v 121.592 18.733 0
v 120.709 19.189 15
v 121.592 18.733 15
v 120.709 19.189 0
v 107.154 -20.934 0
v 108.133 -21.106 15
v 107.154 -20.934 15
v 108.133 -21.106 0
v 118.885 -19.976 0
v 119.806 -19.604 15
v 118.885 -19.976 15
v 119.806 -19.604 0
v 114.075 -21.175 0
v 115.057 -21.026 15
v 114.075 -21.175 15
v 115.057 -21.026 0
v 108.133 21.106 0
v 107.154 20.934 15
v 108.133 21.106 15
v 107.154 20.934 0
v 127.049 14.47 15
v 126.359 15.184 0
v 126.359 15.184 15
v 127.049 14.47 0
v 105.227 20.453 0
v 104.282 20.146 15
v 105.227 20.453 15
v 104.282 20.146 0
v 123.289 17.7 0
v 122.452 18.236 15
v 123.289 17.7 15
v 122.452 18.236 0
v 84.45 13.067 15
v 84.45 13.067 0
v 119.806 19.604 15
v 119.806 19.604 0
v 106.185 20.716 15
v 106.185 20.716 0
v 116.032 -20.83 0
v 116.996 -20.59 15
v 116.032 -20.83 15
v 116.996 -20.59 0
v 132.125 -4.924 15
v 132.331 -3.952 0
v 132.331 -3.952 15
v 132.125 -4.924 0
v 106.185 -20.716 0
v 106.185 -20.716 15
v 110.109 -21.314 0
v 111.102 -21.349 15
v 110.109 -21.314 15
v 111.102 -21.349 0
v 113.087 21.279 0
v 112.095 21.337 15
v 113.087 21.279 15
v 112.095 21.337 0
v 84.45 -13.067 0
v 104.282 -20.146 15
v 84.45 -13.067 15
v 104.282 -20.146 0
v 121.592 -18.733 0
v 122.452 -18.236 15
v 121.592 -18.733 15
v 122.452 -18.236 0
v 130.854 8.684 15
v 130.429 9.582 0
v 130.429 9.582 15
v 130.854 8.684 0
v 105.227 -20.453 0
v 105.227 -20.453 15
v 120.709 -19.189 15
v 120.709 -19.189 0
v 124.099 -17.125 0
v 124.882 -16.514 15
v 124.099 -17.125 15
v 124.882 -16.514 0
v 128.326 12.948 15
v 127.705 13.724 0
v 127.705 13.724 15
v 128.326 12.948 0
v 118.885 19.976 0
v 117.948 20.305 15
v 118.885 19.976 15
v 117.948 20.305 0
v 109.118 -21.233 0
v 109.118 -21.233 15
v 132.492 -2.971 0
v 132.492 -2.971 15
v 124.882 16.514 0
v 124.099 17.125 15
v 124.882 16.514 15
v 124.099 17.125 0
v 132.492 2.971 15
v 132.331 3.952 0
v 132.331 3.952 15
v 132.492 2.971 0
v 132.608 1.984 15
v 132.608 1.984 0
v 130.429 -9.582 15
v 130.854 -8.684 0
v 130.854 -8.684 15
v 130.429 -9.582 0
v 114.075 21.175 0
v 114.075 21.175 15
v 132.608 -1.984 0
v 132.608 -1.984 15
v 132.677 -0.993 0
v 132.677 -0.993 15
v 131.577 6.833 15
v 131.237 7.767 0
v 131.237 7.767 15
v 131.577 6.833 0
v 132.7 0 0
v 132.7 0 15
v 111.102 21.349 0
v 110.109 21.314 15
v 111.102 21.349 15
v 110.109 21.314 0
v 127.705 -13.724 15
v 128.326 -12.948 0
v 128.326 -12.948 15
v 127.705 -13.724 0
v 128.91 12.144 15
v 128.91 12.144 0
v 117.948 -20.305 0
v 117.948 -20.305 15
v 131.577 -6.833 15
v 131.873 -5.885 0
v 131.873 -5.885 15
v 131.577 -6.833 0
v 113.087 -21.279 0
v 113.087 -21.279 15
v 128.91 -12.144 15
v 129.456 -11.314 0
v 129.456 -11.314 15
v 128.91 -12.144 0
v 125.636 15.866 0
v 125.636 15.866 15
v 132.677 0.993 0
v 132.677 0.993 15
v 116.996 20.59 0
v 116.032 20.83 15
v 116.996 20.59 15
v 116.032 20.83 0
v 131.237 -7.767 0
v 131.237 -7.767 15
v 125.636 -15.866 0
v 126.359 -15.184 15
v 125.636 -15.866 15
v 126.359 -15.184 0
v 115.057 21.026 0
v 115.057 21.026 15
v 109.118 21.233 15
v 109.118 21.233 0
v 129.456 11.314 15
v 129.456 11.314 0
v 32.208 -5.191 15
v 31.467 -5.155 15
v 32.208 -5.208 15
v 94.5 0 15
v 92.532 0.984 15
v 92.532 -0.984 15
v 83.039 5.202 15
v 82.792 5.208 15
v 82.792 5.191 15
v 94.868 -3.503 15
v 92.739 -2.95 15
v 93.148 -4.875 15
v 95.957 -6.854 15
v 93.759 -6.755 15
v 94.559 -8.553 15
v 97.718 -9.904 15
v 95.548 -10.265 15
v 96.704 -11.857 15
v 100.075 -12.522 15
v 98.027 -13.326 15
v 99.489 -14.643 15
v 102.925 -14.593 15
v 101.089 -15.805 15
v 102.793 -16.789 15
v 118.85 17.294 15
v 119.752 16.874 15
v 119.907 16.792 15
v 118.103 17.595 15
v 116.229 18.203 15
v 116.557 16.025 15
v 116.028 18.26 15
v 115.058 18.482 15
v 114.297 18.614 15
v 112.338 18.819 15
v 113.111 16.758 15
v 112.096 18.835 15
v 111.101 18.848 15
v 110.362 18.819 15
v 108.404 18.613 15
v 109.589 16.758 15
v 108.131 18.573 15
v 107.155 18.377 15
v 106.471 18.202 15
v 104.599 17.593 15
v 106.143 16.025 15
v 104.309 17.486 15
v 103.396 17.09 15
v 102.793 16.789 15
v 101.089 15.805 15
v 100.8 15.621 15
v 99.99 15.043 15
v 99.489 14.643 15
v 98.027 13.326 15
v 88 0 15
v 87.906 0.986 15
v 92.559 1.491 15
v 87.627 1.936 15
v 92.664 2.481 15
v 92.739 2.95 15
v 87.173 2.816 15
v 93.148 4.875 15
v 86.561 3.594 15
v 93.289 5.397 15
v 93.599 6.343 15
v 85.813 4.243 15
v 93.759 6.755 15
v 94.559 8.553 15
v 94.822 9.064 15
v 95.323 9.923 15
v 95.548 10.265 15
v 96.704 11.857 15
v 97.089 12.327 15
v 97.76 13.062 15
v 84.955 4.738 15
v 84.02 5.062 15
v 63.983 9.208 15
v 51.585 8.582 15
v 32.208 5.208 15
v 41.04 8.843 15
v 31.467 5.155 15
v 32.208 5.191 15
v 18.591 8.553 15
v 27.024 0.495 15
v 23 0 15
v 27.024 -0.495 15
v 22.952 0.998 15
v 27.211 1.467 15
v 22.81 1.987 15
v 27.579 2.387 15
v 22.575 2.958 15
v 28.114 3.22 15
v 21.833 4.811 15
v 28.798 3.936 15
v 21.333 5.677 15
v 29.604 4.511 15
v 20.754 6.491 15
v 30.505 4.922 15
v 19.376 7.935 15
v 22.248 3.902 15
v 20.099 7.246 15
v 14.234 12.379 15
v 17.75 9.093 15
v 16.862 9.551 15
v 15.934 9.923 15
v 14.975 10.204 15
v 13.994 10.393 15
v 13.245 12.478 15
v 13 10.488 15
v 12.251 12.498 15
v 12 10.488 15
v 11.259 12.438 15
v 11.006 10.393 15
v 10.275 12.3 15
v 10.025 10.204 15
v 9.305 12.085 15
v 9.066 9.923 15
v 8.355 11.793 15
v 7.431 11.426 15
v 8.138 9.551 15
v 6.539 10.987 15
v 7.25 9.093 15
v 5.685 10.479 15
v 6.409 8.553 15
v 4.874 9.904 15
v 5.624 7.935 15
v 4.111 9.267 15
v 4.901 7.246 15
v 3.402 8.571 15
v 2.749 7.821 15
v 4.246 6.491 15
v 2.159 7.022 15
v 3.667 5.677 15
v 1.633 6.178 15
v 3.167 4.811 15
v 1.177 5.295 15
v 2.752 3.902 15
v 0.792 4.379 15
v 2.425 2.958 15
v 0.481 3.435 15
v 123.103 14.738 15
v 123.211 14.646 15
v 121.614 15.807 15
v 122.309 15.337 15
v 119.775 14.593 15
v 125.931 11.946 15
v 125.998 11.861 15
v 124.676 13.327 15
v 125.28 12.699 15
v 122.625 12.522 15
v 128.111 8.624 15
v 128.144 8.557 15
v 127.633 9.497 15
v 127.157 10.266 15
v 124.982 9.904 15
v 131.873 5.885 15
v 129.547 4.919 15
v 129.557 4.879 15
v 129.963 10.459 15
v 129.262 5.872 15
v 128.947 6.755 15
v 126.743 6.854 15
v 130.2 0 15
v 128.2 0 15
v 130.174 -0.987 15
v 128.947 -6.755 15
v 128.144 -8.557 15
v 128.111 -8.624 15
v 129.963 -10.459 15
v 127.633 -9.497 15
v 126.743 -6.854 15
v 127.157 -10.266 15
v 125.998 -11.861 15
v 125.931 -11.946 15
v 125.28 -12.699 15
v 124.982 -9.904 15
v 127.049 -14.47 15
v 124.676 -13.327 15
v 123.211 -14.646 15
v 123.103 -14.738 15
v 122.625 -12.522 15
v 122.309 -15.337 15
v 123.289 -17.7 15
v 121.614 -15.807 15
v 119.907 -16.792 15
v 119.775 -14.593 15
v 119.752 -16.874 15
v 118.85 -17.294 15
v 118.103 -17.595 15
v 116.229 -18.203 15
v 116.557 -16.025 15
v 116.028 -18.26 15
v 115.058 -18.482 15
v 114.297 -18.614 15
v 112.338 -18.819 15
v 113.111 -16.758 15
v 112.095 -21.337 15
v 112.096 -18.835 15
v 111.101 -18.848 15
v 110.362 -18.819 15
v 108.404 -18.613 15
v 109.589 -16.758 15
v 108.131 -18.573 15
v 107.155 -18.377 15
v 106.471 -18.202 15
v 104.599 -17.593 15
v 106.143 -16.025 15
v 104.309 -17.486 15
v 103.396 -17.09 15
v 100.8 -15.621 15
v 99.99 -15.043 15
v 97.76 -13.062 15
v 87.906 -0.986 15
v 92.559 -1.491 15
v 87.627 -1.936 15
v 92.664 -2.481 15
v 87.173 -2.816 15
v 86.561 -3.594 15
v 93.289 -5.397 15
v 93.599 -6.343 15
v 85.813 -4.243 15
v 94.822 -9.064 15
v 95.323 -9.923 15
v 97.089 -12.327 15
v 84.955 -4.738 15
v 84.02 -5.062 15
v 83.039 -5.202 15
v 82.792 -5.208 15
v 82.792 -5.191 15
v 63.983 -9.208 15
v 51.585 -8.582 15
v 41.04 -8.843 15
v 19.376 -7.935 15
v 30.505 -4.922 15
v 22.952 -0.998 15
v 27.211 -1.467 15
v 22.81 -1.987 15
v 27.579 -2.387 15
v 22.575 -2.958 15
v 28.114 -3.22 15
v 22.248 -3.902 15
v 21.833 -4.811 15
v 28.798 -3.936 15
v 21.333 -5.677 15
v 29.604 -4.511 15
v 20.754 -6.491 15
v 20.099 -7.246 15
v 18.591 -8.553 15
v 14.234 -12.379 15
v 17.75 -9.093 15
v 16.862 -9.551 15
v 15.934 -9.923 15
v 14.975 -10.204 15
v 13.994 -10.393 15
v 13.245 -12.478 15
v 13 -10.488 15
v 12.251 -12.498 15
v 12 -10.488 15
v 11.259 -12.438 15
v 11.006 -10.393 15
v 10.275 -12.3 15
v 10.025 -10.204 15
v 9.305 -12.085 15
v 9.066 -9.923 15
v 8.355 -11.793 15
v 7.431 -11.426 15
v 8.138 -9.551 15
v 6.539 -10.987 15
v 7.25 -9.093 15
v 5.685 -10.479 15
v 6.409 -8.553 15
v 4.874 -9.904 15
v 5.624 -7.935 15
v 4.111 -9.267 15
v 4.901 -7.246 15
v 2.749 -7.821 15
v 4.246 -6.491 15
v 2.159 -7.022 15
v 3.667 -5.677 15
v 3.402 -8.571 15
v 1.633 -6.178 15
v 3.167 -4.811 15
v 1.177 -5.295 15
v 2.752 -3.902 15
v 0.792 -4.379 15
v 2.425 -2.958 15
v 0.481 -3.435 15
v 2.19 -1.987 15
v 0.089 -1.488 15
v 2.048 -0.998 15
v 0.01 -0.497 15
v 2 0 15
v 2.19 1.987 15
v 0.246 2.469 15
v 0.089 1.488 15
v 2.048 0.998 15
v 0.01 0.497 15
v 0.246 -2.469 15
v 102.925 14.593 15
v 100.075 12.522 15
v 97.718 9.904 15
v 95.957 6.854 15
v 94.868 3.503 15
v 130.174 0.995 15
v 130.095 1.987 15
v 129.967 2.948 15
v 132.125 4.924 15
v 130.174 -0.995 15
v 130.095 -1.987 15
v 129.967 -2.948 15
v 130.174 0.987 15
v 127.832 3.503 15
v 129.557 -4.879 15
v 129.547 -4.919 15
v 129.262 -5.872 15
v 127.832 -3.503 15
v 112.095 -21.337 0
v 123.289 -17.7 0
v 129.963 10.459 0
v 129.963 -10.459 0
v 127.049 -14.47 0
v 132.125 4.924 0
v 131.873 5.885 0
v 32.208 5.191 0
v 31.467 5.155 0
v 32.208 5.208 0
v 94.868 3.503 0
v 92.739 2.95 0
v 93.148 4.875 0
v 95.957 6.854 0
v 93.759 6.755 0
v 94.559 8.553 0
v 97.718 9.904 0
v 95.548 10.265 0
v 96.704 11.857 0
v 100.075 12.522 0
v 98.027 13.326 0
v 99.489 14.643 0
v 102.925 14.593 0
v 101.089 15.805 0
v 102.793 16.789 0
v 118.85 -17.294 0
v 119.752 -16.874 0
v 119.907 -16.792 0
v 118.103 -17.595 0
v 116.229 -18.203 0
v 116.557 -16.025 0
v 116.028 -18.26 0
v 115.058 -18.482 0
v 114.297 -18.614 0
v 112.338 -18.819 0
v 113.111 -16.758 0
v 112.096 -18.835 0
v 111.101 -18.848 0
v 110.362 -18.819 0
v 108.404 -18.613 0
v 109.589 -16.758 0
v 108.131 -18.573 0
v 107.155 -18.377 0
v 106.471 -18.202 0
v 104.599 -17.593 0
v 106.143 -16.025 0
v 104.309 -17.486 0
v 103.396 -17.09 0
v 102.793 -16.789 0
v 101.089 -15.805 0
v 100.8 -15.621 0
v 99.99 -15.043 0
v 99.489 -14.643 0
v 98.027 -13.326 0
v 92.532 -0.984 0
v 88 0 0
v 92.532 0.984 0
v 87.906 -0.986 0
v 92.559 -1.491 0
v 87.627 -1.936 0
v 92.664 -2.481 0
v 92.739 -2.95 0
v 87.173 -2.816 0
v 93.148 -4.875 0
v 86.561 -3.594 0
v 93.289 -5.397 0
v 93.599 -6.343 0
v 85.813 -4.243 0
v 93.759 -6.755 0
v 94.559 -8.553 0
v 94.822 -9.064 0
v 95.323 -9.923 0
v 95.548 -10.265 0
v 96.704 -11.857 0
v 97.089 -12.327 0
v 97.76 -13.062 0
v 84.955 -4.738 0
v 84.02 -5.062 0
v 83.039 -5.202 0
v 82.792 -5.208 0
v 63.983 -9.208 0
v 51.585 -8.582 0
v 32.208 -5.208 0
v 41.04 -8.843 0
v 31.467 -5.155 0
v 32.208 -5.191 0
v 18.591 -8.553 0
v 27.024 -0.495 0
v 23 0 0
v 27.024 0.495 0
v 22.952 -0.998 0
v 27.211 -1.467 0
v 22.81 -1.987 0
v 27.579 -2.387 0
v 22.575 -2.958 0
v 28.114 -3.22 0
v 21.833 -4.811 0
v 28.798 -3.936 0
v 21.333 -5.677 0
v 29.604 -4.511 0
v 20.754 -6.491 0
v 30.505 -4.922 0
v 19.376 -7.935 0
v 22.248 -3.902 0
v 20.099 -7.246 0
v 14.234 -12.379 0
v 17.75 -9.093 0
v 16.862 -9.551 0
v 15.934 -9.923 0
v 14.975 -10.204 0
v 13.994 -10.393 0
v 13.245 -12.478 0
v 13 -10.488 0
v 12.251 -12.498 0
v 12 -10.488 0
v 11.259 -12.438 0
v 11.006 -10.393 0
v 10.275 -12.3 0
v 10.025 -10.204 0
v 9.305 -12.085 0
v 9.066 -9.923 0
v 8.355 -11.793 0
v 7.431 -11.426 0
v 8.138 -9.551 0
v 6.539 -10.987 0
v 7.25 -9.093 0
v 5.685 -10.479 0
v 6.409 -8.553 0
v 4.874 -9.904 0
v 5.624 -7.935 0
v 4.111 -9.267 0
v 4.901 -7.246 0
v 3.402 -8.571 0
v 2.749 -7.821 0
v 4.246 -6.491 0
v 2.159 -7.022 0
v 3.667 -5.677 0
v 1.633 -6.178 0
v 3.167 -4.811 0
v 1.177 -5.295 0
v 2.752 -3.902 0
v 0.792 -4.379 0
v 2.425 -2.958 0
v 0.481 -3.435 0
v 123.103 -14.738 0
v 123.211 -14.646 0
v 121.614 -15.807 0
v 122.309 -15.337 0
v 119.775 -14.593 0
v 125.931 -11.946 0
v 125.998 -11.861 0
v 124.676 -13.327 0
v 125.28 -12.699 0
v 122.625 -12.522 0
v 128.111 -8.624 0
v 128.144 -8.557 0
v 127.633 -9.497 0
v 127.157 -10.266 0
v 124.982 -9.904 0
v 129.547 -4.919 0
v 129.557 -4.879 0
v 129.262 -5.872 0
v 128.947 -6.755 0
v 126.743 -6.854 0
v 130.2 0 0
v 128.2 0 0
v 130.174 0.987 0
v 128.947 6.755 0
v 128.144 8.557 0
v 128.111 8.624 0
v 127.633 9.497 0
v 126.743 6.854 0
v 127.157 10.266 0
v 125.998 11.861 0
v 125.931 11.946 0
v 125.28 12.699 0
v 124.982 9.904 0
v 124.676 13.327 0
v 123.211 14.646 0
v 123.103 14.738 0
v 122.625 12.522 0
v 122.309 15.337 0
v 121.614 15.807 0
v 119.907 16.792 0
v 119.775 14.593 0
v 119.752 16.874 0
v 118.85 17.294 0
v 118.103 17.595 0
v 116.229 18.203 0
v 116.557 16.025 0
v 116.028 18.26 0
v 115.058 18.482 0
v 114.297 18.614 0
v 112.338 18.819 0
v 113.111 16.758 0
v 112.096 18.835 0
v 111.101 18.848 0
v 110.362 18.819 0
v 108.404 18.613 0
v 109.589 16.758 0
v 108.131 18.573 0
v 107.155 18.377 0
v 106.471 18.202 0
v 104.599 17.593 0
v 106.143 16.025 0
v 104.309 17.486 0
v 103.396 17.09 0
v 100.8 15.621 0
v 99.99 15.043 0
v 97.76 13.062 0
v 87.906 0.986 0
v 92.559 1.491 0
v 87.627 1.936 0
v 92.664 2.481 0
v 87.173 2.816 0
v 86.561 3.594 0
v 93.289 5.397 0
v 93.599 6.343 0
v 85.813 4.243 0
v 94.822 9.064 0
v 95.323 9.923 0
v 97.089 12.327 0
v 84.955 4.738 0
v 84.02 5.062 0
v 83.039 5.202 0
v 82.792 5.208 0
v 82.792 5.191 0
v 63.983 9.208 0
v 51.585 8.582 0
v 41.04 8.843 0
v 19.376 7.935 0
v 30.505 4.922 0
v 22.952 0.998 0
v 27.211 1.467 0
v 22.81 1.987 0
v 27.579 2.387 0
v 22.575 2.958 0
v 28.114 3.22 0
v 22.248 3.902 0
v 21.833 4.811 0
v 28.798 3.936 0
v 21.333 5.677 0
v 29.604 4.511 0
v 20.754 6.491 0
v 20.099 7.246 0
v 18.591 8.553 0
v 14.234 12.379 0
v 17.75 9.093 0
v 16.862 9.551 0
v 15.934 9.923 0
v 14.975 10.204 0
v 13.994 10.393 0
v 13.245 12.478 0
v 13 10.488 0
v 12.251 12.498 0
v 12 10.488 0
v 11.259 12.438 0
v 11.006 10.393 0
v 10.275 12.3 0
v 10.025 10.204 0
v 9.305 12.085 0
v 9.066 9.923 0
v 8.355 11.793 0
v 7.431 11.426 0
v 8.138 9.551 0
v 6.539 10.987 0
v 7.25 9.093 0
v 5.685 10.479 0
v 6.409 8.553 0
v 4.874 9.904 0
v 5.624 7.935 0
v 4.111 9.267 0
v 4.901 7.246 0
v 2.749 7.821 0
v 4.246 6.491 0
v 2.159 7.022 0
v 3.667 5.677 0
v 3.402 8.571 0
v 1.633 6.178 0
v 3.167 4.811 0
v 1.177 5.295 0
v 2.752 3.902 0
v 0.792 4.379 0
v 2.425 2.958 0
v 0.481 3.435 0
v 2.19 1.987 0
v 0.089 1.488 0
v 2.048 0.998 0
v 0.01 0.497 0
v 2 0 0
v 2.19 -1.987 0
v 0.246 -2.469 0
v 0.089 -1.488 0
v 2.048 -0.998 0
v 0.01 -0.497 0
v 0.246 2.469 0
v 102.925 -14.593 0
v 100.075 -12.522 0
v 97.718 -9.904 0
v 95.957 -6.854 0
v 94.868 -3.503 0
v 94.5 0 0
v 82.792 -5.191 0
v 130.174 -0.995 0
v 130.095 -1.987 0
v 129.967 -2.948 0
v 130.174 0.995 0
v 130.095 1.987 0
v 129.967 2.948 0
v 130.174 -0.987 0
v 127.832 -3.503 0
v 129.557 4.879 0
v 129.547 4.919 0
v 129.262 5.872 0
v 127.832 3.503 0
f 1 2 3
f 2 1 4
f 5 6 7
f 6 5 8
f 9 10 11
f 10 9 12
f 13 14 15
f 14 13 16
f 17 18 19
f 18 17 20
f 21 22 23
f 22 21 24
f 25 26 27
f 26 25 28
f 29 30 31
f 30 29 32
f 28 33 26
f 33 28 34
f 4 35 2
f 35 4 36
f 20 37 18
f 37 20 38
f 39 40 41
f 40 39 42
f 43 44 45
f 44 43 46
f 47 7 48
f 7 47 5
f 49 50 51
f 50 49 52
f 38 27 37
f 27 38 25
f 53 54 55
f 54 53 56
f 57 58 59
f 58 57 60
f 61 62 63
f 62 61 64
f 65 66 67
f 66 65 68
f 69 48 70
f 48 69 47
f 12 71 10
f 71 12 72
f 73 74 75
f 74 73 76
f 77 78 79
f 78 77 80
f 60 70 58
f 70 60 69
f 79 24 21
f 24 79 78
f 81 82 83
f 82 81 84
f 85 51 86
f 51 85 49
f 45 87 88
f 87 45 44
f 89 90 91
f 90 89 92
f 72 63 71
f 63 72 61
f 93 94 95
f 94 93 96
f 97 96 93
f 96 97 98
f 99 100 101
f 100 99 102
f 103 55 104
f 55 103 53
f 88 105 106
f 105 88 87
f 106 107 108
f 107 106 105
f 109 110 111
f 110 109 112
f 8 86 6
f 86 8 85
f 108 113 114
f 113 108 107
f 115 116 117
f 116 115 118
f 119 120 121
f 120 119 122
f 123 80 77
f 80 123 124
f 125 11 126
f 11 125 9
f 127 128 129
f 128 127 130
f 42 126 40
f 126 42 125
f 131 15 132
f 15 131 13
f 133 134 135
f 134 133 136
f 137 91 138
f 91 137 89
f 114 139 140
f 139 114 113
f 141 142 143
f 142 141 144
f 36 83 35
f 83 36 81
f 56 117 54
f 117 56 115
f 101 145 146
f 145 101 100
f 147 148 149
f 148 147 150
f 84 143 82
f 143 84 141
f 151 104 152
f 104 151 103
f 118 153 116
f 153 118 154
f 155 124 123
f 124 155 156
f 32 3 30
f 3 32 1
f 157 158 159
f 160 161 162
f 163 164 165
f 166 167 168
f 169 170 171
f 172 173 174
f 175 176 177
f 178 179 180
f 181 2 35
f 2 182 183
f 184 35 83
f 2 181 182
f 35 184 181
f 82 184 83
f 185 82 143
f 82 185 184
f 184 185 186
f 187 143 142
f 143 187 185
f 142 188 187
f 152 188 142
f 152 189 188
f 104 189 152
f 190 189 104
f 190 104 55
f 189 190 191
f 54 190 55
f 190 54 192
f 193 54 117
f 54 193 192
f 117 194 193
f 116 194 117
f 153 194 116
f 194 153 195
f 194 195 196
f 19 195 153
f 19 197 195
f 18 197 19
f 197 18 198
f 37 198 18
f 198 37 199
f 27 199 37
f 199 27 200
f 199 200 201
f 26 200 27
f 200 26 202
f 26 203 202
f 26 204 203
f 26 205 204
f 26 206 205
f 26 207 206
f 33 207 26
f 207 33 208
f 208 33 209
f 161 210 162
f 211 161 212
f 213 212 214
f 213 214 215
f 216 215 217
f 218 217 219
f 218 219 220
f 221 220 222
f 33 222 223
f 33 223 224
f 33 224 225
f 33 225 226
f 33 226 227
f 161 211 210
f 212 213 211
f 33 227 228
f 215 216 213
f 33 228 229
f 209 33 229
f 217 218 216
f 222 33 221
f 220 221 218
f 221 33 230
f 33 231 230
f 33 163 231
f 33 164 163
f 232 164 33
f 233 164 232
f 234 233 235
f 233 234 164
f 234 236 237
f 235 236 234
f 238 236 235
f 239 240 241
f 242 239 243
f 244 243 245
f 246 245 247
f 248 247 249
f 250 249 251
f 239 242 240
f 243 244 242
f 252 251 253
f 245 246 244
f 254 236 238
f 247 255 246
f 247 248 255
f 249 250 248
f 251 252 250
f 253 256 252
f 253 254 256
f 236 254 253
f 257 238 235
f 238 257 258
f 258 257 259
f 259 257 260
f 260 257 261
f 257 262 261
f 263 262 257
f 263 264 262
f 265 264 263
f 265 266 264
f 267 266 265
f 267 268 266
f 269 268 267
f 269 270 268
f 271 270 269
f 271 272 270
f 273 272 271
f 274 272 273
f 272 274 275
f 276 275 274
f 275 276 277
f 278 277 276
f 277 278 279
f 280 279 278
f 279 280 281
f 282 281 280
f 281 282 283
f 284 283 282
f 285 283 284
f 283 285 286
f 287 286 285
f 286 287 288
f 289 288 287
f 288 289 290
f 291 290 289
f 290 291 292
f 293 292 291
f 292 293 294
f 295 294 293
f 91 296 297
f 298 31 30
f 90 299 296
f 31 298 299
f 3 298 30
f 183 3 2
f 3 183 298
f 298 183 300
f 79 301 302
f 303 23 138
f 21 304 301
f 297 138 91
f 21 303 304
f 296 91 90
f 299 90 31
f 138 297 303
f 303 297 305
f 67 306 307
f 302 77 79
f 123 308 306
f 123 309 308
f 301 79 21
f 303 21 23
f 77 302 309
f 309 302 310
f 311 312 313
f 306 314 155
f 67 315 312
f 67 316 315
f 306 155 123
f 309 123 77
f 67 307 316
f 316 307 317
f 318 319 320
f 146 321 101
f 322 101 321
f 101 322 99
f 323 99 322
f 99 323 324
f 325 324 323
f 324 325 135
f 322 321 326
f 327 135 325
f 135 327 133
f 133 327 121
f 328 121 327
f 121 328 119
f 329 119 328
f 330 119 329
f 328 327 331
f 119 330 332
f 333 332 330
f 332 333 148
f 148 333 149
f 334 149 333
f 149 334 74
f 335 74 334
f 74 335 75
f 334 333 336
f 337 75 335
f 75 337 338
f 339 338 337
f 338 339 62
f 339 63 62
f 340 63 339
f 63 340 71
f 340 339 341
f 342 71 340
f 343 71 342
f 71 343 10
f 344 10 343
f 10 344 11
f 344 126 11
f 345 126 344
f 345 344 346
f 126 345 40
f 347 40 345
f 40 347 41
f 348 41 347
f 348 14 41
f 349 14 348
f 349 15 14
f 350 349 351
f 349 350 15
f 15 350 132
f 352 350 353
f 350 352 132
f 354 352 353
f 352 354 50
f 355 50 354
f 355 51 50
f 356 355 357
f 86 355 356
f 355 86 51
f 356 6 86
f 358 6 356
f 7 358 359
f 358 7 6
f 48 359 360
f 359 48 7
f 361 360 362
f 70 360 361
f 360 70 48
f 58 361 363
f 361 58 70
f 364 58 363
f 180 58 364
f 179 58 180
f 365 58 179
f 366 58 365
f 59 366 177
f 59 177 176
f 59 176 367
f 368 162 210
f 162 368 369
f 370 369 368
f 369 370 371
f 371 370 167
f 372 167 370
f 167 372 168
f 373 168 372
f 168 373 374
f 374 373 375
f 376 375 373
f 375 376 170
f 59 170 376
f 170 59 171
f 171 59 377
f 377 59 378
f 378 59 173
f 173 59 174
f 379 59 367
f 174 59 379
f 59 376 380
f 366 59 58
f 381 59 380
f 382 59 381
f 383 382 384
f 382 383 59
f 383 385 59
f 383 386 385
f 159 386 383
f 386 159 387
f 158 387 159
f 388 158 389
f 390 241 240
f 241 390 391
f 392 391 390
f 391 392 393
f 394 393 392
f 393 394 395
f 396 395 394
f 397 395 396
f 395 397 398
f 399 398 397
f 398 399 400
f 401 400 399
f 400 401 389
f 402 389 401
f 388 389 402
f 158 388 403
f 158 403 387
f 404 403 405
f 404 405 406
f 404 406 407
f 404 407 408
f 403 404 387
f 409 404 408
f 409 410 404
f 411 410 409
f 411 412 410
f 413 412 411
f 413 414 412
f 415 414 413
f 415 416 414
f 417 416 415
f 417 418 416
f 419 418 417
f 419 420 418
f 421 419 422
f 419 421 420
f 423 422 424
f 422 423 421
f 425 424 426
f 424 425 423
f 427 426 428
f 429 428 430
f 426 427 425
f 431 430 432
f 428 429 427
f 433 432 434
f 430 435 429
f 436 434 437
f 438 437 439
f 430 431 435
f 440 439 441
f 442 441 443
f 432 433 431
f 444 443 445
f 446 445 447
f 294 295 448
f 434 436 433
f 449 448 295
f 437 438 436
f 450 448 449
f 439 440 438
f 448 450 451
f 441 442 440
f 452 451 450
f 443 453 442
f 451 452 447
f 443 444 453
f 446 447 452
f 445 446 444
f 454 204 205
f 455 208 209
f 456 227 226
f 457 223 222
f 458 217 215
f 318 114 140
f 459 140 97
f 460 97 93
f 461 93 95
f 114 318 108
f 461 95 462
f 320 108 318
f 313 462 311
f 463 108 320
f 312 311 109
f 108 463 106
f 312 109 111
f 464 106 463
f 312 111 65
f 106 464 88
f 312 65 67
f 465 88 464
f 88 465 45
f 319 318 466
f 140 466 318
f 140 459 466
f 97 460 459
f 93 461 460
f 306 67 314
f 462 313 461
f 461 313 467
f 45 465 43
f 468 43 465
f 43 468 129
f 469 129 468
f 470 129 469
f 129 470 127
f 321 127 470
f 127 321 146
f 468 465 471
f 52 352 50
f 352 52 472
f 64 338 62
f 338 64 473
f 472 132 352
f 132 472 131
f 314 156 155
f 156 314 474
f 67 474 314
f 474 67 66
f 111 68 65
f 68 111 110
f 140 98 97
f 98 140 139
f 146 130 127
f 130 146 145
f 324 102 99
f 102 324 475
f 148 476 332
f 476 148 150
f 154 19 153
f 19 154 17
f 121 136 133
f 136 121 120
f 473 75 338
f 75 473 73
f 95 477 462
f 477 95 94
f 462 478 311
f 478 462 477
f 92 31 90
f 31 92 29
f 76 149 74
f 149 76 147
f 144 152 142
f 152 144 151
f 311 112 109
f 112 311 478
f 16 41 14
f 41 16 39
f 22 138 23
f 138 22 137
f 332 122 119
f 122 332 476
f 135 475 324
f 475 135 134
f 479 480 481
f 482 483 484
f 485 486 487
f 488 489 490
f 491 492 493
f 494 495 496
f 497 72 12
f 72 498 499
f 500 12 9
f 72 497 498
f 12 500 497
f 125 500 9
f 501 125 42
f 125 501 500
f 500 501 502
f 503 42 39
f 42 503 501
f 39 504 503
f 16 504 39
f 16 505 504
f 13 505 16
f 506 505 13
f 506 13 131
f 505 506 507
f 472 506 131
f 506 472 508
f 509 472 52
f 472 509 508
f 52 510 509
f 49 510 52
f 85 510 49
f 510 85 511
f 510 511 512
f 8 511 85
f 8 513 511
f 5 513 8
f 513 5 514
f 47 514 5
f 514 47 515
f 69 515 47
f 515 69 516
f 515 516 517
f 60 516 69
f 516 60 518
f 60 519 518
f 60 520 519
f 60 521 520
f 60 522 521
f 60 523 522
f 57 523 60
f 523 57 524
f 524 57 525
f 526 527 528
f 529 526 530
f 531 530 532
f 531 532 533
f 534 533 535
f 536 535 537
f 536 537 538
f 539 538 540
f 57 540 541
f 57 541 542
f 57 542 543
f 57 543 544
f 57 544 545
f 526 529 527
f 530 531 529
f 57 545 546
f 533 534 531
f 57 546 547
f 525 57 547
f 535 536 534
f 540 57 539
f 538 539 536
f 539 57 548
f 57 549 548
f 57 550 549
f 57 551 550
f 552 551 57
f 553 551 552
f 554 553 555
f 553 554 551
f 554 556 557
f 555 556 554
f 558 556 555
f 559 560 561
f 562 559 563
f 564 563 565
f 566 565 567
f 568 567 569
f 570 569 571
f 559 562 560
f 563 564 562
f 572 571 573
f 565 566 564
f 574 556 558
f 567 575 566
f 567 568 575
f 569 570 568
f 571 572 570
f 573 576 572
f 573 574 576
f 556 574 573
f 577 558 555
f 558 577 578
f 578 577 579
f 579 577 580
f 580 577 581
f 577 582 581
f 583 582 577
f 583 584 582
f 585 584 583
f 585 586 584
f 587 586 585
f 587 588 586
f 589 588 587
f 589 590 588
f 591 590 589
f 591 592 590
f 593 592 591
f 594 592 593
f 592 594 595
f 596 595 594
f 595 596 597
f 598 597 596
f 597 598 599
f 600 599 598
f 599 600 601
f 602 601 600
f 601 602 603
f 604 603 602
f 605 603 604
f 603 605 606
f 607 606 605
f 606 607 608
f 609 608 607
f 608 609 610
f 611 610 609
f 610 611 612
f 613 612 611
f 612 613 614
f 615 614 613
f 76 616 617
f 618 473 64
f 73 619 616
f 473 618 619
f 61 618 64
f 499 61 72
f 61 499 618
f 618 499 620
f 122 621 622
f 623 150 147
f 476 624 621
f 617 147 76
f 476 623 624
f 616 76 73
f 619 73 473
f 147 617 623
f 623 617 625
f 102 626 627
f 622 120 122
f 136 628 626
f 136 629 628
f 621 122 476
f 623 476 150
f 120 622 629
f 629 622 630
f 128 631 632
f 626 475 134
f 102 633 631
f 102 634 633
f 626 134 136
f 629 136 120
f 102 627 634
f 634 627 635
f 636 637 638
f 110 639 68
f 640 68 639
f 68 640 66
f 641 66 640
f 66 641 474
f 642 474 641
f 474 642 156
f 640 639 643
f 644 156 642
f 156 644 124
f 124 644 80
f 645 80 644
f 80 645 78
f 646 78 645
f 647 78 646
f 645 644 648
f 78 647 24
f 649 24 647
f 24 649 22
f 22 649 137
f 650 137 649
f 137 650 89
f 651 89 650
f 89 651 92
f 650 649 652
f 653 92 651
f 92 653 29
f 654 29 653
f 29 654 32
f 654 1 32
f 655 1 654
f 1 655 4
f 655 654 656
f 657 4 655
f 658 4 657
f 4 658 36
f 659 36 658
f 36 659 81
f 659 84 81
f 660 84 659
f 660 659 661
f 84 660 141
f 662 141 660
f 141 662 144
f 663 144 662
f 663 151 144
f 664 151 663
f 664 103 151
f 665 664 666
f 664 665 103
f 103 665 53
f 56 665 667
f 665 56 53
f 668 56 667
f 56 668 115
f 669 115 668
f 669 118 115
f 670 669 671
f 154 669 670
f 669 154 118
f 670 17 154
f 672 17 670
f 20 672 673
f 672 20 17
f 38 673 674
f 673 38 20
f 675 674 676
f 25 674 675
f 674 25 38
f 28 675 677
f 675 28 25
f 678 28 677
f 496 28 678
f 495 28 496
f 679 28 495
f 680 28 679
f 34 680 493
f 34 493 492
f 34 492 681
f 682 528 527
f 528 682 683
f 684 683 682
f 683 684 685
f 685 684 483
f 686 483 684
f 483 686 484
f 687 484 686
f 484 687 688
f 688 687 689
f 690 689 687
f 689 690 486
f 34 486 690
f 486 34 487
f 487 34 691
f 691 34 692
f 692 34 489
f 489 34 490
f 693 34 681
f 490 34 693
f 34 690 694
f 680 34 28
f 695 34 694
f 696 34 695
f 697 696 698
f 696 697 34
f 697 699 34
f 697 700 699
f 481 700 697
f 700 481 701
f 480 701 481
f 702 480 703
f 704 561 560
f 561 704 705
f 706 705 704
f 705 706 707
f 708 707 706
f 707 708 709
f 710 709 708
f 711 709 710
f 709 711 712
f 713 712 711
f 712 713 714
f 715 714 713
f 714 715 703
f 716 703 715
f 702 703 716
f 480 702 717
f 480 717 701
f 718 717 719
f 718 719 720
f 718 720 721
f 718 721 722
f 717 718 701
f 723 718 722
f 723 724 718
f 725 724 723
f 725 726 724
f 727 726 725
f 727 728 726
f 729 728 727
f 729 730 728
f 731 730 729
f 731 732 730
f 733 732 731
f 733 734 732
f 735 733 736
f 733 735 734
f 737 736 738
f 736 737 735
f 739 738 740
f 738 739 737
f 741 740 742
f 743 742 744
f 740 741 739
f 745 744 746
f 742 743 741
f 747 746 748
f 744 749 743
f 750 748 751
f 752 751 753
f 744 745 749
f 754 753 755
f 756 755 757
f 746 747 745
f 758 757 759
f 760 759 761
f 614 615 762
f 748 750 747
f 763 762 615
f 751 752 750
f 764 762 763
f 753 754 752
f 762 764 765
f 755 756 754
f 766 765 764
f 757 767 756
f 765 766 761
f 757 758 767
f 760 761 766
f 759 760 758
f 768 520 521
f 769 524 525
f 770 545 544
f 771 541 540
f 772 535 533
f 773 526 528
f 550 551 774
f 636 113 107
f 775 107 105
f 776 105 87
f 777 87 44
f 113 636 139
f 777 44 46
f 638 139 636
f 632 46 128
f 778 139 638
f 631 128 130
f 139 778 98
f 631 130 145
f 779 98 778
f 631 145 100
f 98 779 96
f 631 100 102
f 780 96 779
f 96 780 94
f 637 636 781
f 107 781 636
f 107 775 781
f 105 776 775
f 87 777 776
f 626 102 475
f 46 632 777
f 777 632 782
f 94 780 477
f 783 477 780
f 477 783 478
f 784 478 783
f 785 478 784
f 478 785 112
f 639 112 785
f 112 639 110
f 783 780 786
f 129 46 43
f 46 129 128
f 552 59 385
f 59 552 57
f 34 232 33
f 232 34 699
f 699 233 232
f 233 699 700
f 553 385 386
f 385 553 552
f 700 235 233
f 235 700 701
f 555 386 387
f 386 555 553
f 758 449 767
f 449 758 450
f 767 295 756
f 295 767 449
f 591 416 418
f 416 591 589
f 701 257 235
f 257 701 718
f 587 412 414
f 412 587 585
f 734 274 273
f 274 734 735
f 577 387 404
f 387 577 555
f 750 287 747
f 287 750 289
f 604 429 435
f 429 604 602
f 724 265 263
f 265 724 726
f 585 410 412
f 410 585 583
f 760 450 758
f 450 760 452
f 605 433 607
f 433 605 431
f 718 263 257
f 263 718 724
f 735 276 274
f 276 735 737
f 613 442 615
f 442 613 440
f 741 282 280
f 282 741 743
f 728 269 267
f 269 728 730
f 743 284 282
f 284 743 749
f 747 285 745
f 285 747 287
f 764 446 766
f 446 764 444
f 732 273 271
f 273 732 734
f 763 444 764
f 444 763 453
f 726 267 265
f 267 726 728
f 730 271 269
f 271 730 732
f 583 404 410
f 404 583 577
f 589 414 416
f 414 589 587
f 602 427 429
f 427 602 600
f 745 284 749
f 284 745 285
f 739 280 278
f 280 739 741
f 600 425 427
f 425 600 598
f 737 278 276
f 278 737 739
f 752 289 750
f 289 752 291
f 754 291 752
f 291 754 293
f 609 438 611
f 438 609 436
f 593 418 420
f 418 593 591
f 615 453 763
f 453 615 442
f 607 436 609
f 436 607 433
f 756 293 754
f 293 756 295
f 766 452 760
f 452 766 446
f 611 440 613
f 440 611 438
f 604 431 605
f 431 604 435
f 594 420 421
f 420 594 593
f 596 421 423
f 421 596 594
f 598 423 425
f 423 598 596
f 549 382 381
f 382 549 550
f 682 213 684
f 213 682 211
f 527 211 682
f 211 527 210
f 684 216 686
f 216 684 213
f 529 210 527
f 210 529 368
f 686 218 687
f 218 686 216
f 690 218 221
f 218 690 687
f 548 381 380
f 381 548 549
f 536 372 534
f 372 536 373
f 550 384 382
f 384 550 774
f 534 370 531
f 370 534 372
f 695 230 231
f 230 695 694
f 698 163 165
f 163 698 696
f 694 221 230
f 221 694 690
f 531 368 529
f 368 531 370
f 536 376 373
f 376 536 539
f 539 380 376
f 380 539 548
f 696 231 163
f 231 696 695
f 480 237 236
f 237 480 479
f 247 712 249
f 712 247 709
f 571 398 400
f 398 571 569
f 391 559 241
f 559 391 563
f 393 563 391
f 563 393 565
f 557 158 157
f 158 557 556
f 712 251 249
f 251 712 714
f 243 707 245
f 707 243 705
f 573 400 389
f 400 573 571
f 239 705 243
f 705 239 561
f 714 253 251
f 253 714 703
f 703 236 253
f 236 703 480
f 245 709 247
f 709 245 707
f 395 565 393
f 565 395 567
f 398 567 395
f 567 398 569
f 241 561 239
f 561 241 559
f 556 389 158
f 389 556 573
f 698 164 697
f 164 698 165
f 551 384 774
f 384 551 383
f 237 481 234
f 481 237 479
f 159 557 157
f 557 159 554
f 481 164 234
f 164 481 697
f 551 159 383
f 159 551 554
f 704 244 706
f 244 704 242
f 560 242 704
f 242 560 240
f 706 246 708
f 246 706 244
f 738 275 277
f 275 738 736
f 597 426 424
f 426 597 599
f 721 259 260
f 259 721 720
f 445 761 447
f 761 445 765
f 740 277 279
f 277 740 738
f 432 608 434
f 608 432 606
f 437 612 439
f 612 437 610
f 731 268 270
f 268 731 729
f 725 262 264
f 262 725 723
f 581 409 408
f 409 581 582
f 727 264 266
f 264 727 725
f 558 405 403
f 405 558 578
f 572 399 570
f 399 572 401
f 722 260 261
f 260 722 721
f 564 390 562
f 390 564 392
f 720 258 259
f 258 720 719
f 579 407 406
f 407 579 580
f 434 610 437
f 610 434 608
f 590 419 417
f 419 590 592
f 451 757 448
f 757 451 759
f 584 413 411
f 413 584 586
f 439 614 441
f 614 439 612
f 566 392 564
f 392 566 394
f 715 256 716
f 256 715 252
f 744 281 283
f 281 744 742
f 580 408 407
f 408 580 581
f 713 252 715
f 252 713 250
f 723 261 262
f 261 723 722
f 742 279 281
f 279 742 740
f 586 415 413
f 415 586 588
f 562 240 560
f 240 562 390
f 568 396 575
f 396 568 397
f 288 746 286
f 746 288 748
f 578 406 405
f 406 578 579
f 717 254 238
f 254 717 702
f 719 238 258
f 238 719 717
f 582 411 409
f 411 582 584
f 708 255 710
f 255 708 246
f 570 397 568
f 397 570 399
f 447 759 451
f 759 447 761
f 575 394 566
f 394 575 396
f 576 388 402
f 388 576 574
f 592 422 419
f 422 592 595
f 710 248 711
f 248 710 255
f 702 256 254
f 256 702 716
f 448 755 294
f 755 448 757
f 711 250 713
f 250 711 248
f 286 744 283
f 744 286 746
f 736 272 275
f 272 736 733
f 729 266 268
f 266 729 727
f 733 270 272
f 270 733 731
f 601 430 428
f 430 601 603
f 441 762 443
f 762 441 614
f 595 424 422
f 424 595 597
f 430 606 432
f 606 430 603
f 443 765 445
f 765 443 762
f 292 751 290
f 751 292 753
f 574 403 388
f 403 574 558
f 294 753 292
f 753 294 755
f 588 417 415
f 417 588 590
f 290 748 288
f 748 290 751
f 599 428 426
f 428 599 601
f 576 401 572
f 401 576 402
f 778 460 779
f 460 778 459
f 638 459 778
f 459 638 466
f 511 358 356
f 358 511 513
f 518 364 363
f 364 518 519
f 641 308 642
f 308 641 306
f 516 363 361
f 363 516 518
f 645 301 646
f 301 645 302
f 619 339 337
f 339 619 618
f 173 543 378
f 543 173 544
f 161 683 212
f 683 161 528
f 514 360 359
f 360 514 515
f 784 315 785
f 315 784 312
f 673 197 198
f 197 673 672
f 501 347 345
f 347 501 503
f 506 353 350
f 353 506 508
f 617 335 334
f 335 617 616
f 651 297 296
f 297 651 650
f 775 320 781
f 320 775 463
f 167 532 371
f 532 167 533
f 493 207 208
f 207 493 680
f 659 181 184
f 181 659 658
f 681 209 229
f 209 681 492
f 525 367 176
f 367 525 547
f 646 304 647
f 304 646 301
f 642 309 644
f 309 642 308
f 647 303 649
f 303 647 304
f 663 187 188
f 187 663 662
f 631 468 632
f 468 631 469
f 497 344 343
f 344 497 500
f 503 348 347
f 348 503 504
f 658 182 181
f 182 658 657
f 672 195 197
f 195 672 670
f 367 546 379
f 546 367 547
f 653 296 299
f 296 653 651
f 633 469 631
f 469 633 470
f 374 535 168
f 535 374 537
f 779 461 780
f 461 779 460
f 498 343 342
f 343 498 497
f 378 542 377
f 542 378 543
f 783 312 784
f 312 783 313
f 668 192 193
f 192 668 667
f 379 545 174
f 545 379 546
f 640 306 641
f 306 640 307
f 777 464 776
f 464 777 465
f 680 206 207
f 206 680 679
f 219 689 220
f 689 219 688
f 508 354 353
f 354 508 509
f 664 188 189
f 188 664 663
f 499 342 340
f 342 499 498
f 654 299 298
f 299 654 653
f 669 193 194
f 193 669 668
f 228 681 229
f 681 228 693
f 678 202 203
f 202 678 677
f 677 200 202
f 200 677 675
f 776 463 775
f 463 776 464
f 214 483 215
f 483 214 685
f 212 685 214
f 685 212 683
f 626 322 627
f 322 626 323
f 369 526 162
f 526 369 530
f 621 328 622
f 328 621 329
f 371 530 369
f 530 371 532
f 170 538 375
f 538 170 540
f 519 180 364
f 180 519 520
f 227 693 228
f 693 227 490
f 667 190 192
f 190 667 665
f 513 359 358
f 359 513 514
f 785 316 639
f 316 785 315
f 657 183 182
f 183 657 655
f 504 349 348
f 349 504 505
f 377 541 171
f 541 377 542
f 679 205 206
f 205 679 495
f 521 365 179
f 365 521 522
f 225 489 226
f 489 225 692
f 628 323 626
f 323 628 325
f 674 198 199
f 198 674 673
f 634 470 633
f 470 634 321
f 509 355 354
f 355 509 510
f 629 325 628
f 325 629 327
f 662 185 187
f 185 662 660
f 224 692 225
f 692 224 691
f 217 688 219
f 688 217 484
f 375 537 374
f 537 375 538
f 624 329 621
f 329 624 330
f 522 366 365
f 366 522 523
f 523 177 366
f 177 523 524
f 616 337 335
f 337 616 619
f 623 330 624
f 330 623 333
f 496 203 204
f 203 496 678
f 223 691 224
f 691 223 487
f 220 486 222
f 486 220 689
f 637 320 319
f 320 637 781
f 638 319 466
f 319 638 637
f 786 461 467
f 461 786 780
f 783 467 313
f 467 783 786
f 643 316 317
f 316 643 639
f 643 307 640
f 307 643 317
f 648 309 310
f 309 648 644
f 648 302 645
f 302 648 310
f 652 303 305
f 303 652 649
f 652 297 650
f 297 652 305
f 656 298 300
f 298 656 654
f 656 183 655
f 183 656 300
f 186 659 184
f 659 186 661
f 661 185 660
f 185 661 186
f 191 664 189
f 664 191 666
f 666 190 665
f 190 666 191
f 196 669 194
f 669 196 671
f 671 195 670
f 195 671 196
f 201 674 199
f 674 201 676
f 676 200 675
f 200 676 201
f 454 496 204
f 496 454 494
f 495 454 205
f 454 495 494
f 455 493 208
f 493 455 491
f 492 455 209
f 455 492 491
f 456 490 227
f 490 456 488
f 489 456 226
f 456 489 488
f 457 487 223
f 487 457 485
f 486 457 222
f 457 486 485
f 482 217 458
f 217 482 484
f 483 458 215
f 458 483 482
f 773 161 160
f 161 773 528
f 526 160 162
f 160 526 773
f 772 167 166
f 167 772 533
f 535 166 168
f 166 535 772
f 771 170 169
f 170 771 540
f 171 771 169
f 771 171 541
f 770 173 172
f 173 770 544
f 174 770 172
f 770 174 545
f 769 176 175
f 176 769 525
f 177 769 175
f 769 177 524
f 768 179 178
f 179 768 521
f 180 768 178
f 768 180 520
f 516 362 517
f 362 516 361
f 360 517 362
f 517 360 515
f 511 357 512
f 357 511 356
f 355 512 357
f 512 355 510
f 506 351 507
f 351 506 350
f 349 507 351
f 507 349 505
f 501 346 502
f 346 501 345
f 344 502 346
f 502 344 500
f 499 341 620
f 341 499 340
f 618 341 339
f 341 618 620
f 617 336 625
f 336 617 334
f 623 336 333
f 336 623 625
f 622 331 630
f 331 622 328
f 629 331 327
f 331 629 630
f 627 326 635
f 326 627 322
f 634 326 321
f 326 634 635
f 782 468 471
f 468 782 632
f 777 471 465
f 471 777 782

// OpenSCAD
/* [General] */

height = 15; // [1:50]


/* [Grip hole] */

diameter = 37.7; // [5:0.1:100]
border = 2.5; // [1:0.1:20]


/* [Teeth] */

teeth_number = 30; // [1:500]
teeth_height = 2; // [0.1:0.1:50]
teeth_width = 2; // [0.1:0.1:50]


/* [Handle] */

handle_width = 25; // [5:50]
handle_length = 90; // [50: 500]
handle_border = 2; // [1:0.1:25]


/* [Test] */

test = "false"; // [true, false]


/* [Hidden] */

subtract_safe = 1;
$fa = 0.1;
$fs = 1;


module oval(length, width, height) {
     translate([length / 2 - width / 2, 0, 0])
	  cylinder(r = width / 2, h = height);
     translate([-length / 2 + width / 2, 0, 0])
	  cylinder(r = width / 2, h = height);
     translate([0, 0, height / 2])
	  cube([length - width, width, height], center = true);
}

module solid() {
     union() {
	  translate([handle_length + diameter / 2 + border, 0, 0])
	       cylinder(d = diameter + border * 2, h = height);

	  if (test == "false") {
	       hull() {
		    translate([handle_length + diameter / 2 + border, 0, 0])
			 cylinder(d = diameter + border * 2, h = height);
		    translate([handle_length - handle_border, 0, 0])
			 cylinder(d = handle_width + handle_border, h = height);
	       }
	       
	       hull() {
		    translate([handle_length - handle_border, 0, 0])
			 cylinder(d = handle_width + handle_border, h = height);
		    translate([handle_length - handle_width, 0, 0])
			 cylinder(d = handle_width / 2 + handle_border * 3, h = height);
	       }
	       
	       hull() {
		    translate([handle_length - handle_width, 0, 0])
			 cylinder(d = handle_width / 2 + handle_border * 3, h = height);
		    translate([handle_length / 2, 0, 0])
			 cylinder(d = handle_width / 2 + handle_border * 2, h = height);
	       }
	       
	       hull() {
		    translate([handle_length - handle_width, 0, 0])
			 cylinder(d = handle_width / 2 + handle_border * 2, h = height);
		    translate([handle_width , 0, 0])
			 cylinder(d = handle_width / 2 + handle_border * 3, h = height);
	       }
	       
	       hull() {
		    translate([handle_length / 2, 0, 0])
			 cylinder(d = handle_width / 2 + handle_border * 2, h = height);
		    translate([handle_width / 2, 0, 0])
			 cylinder(r = handle_width / 2, h = height);
	       }
	       
	       translate([handle_width / 2, 0, 0])
		    cylinder(r = handle_width / 2, h = height);
	  }
     }
}

module holes() {
     union() {
	  translate([handle_length + diameter / 2 + border, 0, -subtract_safe])
	       cylinder(d = diameter, h = height + subtract_safe * 2);

	  if (test == "false") {
	       translate([handle_length / 2 + handle_width / 2, 0, -subtract_safe])
		    oval(handle_length - handle_width - handle_border * 2, handle_width * 5 / 12, height + subtract_safe * 2);
	       
	       translate([handle_width / 2, 0, -subtract_safe])
		    cylinder(r = handle_width / 2 - handle_border, h = height + subtract_safe * 2);
	  }
     }
}

module teeth() {
     translate([handle_length + diameter / 2 + border, 0, 0])
     union() {
	  for(i = [0:teeth_number]) {
	       rotate([0, 0, i * 360 / teeth_number])
		    translate([diameter / 2, 0, 0])
		    linear_extrude(height = height, convexity = 10, twist = 0)
		    polygon(points=[[-teeth_height, 0],[0, -teeth_width / 2],[0, teeth_width / 2]], paths=[[0, 1, 2]]);
	  }
     }
}

union() {
     difference() {
	  solid();
	  holes();
     }
     teeth();
}
